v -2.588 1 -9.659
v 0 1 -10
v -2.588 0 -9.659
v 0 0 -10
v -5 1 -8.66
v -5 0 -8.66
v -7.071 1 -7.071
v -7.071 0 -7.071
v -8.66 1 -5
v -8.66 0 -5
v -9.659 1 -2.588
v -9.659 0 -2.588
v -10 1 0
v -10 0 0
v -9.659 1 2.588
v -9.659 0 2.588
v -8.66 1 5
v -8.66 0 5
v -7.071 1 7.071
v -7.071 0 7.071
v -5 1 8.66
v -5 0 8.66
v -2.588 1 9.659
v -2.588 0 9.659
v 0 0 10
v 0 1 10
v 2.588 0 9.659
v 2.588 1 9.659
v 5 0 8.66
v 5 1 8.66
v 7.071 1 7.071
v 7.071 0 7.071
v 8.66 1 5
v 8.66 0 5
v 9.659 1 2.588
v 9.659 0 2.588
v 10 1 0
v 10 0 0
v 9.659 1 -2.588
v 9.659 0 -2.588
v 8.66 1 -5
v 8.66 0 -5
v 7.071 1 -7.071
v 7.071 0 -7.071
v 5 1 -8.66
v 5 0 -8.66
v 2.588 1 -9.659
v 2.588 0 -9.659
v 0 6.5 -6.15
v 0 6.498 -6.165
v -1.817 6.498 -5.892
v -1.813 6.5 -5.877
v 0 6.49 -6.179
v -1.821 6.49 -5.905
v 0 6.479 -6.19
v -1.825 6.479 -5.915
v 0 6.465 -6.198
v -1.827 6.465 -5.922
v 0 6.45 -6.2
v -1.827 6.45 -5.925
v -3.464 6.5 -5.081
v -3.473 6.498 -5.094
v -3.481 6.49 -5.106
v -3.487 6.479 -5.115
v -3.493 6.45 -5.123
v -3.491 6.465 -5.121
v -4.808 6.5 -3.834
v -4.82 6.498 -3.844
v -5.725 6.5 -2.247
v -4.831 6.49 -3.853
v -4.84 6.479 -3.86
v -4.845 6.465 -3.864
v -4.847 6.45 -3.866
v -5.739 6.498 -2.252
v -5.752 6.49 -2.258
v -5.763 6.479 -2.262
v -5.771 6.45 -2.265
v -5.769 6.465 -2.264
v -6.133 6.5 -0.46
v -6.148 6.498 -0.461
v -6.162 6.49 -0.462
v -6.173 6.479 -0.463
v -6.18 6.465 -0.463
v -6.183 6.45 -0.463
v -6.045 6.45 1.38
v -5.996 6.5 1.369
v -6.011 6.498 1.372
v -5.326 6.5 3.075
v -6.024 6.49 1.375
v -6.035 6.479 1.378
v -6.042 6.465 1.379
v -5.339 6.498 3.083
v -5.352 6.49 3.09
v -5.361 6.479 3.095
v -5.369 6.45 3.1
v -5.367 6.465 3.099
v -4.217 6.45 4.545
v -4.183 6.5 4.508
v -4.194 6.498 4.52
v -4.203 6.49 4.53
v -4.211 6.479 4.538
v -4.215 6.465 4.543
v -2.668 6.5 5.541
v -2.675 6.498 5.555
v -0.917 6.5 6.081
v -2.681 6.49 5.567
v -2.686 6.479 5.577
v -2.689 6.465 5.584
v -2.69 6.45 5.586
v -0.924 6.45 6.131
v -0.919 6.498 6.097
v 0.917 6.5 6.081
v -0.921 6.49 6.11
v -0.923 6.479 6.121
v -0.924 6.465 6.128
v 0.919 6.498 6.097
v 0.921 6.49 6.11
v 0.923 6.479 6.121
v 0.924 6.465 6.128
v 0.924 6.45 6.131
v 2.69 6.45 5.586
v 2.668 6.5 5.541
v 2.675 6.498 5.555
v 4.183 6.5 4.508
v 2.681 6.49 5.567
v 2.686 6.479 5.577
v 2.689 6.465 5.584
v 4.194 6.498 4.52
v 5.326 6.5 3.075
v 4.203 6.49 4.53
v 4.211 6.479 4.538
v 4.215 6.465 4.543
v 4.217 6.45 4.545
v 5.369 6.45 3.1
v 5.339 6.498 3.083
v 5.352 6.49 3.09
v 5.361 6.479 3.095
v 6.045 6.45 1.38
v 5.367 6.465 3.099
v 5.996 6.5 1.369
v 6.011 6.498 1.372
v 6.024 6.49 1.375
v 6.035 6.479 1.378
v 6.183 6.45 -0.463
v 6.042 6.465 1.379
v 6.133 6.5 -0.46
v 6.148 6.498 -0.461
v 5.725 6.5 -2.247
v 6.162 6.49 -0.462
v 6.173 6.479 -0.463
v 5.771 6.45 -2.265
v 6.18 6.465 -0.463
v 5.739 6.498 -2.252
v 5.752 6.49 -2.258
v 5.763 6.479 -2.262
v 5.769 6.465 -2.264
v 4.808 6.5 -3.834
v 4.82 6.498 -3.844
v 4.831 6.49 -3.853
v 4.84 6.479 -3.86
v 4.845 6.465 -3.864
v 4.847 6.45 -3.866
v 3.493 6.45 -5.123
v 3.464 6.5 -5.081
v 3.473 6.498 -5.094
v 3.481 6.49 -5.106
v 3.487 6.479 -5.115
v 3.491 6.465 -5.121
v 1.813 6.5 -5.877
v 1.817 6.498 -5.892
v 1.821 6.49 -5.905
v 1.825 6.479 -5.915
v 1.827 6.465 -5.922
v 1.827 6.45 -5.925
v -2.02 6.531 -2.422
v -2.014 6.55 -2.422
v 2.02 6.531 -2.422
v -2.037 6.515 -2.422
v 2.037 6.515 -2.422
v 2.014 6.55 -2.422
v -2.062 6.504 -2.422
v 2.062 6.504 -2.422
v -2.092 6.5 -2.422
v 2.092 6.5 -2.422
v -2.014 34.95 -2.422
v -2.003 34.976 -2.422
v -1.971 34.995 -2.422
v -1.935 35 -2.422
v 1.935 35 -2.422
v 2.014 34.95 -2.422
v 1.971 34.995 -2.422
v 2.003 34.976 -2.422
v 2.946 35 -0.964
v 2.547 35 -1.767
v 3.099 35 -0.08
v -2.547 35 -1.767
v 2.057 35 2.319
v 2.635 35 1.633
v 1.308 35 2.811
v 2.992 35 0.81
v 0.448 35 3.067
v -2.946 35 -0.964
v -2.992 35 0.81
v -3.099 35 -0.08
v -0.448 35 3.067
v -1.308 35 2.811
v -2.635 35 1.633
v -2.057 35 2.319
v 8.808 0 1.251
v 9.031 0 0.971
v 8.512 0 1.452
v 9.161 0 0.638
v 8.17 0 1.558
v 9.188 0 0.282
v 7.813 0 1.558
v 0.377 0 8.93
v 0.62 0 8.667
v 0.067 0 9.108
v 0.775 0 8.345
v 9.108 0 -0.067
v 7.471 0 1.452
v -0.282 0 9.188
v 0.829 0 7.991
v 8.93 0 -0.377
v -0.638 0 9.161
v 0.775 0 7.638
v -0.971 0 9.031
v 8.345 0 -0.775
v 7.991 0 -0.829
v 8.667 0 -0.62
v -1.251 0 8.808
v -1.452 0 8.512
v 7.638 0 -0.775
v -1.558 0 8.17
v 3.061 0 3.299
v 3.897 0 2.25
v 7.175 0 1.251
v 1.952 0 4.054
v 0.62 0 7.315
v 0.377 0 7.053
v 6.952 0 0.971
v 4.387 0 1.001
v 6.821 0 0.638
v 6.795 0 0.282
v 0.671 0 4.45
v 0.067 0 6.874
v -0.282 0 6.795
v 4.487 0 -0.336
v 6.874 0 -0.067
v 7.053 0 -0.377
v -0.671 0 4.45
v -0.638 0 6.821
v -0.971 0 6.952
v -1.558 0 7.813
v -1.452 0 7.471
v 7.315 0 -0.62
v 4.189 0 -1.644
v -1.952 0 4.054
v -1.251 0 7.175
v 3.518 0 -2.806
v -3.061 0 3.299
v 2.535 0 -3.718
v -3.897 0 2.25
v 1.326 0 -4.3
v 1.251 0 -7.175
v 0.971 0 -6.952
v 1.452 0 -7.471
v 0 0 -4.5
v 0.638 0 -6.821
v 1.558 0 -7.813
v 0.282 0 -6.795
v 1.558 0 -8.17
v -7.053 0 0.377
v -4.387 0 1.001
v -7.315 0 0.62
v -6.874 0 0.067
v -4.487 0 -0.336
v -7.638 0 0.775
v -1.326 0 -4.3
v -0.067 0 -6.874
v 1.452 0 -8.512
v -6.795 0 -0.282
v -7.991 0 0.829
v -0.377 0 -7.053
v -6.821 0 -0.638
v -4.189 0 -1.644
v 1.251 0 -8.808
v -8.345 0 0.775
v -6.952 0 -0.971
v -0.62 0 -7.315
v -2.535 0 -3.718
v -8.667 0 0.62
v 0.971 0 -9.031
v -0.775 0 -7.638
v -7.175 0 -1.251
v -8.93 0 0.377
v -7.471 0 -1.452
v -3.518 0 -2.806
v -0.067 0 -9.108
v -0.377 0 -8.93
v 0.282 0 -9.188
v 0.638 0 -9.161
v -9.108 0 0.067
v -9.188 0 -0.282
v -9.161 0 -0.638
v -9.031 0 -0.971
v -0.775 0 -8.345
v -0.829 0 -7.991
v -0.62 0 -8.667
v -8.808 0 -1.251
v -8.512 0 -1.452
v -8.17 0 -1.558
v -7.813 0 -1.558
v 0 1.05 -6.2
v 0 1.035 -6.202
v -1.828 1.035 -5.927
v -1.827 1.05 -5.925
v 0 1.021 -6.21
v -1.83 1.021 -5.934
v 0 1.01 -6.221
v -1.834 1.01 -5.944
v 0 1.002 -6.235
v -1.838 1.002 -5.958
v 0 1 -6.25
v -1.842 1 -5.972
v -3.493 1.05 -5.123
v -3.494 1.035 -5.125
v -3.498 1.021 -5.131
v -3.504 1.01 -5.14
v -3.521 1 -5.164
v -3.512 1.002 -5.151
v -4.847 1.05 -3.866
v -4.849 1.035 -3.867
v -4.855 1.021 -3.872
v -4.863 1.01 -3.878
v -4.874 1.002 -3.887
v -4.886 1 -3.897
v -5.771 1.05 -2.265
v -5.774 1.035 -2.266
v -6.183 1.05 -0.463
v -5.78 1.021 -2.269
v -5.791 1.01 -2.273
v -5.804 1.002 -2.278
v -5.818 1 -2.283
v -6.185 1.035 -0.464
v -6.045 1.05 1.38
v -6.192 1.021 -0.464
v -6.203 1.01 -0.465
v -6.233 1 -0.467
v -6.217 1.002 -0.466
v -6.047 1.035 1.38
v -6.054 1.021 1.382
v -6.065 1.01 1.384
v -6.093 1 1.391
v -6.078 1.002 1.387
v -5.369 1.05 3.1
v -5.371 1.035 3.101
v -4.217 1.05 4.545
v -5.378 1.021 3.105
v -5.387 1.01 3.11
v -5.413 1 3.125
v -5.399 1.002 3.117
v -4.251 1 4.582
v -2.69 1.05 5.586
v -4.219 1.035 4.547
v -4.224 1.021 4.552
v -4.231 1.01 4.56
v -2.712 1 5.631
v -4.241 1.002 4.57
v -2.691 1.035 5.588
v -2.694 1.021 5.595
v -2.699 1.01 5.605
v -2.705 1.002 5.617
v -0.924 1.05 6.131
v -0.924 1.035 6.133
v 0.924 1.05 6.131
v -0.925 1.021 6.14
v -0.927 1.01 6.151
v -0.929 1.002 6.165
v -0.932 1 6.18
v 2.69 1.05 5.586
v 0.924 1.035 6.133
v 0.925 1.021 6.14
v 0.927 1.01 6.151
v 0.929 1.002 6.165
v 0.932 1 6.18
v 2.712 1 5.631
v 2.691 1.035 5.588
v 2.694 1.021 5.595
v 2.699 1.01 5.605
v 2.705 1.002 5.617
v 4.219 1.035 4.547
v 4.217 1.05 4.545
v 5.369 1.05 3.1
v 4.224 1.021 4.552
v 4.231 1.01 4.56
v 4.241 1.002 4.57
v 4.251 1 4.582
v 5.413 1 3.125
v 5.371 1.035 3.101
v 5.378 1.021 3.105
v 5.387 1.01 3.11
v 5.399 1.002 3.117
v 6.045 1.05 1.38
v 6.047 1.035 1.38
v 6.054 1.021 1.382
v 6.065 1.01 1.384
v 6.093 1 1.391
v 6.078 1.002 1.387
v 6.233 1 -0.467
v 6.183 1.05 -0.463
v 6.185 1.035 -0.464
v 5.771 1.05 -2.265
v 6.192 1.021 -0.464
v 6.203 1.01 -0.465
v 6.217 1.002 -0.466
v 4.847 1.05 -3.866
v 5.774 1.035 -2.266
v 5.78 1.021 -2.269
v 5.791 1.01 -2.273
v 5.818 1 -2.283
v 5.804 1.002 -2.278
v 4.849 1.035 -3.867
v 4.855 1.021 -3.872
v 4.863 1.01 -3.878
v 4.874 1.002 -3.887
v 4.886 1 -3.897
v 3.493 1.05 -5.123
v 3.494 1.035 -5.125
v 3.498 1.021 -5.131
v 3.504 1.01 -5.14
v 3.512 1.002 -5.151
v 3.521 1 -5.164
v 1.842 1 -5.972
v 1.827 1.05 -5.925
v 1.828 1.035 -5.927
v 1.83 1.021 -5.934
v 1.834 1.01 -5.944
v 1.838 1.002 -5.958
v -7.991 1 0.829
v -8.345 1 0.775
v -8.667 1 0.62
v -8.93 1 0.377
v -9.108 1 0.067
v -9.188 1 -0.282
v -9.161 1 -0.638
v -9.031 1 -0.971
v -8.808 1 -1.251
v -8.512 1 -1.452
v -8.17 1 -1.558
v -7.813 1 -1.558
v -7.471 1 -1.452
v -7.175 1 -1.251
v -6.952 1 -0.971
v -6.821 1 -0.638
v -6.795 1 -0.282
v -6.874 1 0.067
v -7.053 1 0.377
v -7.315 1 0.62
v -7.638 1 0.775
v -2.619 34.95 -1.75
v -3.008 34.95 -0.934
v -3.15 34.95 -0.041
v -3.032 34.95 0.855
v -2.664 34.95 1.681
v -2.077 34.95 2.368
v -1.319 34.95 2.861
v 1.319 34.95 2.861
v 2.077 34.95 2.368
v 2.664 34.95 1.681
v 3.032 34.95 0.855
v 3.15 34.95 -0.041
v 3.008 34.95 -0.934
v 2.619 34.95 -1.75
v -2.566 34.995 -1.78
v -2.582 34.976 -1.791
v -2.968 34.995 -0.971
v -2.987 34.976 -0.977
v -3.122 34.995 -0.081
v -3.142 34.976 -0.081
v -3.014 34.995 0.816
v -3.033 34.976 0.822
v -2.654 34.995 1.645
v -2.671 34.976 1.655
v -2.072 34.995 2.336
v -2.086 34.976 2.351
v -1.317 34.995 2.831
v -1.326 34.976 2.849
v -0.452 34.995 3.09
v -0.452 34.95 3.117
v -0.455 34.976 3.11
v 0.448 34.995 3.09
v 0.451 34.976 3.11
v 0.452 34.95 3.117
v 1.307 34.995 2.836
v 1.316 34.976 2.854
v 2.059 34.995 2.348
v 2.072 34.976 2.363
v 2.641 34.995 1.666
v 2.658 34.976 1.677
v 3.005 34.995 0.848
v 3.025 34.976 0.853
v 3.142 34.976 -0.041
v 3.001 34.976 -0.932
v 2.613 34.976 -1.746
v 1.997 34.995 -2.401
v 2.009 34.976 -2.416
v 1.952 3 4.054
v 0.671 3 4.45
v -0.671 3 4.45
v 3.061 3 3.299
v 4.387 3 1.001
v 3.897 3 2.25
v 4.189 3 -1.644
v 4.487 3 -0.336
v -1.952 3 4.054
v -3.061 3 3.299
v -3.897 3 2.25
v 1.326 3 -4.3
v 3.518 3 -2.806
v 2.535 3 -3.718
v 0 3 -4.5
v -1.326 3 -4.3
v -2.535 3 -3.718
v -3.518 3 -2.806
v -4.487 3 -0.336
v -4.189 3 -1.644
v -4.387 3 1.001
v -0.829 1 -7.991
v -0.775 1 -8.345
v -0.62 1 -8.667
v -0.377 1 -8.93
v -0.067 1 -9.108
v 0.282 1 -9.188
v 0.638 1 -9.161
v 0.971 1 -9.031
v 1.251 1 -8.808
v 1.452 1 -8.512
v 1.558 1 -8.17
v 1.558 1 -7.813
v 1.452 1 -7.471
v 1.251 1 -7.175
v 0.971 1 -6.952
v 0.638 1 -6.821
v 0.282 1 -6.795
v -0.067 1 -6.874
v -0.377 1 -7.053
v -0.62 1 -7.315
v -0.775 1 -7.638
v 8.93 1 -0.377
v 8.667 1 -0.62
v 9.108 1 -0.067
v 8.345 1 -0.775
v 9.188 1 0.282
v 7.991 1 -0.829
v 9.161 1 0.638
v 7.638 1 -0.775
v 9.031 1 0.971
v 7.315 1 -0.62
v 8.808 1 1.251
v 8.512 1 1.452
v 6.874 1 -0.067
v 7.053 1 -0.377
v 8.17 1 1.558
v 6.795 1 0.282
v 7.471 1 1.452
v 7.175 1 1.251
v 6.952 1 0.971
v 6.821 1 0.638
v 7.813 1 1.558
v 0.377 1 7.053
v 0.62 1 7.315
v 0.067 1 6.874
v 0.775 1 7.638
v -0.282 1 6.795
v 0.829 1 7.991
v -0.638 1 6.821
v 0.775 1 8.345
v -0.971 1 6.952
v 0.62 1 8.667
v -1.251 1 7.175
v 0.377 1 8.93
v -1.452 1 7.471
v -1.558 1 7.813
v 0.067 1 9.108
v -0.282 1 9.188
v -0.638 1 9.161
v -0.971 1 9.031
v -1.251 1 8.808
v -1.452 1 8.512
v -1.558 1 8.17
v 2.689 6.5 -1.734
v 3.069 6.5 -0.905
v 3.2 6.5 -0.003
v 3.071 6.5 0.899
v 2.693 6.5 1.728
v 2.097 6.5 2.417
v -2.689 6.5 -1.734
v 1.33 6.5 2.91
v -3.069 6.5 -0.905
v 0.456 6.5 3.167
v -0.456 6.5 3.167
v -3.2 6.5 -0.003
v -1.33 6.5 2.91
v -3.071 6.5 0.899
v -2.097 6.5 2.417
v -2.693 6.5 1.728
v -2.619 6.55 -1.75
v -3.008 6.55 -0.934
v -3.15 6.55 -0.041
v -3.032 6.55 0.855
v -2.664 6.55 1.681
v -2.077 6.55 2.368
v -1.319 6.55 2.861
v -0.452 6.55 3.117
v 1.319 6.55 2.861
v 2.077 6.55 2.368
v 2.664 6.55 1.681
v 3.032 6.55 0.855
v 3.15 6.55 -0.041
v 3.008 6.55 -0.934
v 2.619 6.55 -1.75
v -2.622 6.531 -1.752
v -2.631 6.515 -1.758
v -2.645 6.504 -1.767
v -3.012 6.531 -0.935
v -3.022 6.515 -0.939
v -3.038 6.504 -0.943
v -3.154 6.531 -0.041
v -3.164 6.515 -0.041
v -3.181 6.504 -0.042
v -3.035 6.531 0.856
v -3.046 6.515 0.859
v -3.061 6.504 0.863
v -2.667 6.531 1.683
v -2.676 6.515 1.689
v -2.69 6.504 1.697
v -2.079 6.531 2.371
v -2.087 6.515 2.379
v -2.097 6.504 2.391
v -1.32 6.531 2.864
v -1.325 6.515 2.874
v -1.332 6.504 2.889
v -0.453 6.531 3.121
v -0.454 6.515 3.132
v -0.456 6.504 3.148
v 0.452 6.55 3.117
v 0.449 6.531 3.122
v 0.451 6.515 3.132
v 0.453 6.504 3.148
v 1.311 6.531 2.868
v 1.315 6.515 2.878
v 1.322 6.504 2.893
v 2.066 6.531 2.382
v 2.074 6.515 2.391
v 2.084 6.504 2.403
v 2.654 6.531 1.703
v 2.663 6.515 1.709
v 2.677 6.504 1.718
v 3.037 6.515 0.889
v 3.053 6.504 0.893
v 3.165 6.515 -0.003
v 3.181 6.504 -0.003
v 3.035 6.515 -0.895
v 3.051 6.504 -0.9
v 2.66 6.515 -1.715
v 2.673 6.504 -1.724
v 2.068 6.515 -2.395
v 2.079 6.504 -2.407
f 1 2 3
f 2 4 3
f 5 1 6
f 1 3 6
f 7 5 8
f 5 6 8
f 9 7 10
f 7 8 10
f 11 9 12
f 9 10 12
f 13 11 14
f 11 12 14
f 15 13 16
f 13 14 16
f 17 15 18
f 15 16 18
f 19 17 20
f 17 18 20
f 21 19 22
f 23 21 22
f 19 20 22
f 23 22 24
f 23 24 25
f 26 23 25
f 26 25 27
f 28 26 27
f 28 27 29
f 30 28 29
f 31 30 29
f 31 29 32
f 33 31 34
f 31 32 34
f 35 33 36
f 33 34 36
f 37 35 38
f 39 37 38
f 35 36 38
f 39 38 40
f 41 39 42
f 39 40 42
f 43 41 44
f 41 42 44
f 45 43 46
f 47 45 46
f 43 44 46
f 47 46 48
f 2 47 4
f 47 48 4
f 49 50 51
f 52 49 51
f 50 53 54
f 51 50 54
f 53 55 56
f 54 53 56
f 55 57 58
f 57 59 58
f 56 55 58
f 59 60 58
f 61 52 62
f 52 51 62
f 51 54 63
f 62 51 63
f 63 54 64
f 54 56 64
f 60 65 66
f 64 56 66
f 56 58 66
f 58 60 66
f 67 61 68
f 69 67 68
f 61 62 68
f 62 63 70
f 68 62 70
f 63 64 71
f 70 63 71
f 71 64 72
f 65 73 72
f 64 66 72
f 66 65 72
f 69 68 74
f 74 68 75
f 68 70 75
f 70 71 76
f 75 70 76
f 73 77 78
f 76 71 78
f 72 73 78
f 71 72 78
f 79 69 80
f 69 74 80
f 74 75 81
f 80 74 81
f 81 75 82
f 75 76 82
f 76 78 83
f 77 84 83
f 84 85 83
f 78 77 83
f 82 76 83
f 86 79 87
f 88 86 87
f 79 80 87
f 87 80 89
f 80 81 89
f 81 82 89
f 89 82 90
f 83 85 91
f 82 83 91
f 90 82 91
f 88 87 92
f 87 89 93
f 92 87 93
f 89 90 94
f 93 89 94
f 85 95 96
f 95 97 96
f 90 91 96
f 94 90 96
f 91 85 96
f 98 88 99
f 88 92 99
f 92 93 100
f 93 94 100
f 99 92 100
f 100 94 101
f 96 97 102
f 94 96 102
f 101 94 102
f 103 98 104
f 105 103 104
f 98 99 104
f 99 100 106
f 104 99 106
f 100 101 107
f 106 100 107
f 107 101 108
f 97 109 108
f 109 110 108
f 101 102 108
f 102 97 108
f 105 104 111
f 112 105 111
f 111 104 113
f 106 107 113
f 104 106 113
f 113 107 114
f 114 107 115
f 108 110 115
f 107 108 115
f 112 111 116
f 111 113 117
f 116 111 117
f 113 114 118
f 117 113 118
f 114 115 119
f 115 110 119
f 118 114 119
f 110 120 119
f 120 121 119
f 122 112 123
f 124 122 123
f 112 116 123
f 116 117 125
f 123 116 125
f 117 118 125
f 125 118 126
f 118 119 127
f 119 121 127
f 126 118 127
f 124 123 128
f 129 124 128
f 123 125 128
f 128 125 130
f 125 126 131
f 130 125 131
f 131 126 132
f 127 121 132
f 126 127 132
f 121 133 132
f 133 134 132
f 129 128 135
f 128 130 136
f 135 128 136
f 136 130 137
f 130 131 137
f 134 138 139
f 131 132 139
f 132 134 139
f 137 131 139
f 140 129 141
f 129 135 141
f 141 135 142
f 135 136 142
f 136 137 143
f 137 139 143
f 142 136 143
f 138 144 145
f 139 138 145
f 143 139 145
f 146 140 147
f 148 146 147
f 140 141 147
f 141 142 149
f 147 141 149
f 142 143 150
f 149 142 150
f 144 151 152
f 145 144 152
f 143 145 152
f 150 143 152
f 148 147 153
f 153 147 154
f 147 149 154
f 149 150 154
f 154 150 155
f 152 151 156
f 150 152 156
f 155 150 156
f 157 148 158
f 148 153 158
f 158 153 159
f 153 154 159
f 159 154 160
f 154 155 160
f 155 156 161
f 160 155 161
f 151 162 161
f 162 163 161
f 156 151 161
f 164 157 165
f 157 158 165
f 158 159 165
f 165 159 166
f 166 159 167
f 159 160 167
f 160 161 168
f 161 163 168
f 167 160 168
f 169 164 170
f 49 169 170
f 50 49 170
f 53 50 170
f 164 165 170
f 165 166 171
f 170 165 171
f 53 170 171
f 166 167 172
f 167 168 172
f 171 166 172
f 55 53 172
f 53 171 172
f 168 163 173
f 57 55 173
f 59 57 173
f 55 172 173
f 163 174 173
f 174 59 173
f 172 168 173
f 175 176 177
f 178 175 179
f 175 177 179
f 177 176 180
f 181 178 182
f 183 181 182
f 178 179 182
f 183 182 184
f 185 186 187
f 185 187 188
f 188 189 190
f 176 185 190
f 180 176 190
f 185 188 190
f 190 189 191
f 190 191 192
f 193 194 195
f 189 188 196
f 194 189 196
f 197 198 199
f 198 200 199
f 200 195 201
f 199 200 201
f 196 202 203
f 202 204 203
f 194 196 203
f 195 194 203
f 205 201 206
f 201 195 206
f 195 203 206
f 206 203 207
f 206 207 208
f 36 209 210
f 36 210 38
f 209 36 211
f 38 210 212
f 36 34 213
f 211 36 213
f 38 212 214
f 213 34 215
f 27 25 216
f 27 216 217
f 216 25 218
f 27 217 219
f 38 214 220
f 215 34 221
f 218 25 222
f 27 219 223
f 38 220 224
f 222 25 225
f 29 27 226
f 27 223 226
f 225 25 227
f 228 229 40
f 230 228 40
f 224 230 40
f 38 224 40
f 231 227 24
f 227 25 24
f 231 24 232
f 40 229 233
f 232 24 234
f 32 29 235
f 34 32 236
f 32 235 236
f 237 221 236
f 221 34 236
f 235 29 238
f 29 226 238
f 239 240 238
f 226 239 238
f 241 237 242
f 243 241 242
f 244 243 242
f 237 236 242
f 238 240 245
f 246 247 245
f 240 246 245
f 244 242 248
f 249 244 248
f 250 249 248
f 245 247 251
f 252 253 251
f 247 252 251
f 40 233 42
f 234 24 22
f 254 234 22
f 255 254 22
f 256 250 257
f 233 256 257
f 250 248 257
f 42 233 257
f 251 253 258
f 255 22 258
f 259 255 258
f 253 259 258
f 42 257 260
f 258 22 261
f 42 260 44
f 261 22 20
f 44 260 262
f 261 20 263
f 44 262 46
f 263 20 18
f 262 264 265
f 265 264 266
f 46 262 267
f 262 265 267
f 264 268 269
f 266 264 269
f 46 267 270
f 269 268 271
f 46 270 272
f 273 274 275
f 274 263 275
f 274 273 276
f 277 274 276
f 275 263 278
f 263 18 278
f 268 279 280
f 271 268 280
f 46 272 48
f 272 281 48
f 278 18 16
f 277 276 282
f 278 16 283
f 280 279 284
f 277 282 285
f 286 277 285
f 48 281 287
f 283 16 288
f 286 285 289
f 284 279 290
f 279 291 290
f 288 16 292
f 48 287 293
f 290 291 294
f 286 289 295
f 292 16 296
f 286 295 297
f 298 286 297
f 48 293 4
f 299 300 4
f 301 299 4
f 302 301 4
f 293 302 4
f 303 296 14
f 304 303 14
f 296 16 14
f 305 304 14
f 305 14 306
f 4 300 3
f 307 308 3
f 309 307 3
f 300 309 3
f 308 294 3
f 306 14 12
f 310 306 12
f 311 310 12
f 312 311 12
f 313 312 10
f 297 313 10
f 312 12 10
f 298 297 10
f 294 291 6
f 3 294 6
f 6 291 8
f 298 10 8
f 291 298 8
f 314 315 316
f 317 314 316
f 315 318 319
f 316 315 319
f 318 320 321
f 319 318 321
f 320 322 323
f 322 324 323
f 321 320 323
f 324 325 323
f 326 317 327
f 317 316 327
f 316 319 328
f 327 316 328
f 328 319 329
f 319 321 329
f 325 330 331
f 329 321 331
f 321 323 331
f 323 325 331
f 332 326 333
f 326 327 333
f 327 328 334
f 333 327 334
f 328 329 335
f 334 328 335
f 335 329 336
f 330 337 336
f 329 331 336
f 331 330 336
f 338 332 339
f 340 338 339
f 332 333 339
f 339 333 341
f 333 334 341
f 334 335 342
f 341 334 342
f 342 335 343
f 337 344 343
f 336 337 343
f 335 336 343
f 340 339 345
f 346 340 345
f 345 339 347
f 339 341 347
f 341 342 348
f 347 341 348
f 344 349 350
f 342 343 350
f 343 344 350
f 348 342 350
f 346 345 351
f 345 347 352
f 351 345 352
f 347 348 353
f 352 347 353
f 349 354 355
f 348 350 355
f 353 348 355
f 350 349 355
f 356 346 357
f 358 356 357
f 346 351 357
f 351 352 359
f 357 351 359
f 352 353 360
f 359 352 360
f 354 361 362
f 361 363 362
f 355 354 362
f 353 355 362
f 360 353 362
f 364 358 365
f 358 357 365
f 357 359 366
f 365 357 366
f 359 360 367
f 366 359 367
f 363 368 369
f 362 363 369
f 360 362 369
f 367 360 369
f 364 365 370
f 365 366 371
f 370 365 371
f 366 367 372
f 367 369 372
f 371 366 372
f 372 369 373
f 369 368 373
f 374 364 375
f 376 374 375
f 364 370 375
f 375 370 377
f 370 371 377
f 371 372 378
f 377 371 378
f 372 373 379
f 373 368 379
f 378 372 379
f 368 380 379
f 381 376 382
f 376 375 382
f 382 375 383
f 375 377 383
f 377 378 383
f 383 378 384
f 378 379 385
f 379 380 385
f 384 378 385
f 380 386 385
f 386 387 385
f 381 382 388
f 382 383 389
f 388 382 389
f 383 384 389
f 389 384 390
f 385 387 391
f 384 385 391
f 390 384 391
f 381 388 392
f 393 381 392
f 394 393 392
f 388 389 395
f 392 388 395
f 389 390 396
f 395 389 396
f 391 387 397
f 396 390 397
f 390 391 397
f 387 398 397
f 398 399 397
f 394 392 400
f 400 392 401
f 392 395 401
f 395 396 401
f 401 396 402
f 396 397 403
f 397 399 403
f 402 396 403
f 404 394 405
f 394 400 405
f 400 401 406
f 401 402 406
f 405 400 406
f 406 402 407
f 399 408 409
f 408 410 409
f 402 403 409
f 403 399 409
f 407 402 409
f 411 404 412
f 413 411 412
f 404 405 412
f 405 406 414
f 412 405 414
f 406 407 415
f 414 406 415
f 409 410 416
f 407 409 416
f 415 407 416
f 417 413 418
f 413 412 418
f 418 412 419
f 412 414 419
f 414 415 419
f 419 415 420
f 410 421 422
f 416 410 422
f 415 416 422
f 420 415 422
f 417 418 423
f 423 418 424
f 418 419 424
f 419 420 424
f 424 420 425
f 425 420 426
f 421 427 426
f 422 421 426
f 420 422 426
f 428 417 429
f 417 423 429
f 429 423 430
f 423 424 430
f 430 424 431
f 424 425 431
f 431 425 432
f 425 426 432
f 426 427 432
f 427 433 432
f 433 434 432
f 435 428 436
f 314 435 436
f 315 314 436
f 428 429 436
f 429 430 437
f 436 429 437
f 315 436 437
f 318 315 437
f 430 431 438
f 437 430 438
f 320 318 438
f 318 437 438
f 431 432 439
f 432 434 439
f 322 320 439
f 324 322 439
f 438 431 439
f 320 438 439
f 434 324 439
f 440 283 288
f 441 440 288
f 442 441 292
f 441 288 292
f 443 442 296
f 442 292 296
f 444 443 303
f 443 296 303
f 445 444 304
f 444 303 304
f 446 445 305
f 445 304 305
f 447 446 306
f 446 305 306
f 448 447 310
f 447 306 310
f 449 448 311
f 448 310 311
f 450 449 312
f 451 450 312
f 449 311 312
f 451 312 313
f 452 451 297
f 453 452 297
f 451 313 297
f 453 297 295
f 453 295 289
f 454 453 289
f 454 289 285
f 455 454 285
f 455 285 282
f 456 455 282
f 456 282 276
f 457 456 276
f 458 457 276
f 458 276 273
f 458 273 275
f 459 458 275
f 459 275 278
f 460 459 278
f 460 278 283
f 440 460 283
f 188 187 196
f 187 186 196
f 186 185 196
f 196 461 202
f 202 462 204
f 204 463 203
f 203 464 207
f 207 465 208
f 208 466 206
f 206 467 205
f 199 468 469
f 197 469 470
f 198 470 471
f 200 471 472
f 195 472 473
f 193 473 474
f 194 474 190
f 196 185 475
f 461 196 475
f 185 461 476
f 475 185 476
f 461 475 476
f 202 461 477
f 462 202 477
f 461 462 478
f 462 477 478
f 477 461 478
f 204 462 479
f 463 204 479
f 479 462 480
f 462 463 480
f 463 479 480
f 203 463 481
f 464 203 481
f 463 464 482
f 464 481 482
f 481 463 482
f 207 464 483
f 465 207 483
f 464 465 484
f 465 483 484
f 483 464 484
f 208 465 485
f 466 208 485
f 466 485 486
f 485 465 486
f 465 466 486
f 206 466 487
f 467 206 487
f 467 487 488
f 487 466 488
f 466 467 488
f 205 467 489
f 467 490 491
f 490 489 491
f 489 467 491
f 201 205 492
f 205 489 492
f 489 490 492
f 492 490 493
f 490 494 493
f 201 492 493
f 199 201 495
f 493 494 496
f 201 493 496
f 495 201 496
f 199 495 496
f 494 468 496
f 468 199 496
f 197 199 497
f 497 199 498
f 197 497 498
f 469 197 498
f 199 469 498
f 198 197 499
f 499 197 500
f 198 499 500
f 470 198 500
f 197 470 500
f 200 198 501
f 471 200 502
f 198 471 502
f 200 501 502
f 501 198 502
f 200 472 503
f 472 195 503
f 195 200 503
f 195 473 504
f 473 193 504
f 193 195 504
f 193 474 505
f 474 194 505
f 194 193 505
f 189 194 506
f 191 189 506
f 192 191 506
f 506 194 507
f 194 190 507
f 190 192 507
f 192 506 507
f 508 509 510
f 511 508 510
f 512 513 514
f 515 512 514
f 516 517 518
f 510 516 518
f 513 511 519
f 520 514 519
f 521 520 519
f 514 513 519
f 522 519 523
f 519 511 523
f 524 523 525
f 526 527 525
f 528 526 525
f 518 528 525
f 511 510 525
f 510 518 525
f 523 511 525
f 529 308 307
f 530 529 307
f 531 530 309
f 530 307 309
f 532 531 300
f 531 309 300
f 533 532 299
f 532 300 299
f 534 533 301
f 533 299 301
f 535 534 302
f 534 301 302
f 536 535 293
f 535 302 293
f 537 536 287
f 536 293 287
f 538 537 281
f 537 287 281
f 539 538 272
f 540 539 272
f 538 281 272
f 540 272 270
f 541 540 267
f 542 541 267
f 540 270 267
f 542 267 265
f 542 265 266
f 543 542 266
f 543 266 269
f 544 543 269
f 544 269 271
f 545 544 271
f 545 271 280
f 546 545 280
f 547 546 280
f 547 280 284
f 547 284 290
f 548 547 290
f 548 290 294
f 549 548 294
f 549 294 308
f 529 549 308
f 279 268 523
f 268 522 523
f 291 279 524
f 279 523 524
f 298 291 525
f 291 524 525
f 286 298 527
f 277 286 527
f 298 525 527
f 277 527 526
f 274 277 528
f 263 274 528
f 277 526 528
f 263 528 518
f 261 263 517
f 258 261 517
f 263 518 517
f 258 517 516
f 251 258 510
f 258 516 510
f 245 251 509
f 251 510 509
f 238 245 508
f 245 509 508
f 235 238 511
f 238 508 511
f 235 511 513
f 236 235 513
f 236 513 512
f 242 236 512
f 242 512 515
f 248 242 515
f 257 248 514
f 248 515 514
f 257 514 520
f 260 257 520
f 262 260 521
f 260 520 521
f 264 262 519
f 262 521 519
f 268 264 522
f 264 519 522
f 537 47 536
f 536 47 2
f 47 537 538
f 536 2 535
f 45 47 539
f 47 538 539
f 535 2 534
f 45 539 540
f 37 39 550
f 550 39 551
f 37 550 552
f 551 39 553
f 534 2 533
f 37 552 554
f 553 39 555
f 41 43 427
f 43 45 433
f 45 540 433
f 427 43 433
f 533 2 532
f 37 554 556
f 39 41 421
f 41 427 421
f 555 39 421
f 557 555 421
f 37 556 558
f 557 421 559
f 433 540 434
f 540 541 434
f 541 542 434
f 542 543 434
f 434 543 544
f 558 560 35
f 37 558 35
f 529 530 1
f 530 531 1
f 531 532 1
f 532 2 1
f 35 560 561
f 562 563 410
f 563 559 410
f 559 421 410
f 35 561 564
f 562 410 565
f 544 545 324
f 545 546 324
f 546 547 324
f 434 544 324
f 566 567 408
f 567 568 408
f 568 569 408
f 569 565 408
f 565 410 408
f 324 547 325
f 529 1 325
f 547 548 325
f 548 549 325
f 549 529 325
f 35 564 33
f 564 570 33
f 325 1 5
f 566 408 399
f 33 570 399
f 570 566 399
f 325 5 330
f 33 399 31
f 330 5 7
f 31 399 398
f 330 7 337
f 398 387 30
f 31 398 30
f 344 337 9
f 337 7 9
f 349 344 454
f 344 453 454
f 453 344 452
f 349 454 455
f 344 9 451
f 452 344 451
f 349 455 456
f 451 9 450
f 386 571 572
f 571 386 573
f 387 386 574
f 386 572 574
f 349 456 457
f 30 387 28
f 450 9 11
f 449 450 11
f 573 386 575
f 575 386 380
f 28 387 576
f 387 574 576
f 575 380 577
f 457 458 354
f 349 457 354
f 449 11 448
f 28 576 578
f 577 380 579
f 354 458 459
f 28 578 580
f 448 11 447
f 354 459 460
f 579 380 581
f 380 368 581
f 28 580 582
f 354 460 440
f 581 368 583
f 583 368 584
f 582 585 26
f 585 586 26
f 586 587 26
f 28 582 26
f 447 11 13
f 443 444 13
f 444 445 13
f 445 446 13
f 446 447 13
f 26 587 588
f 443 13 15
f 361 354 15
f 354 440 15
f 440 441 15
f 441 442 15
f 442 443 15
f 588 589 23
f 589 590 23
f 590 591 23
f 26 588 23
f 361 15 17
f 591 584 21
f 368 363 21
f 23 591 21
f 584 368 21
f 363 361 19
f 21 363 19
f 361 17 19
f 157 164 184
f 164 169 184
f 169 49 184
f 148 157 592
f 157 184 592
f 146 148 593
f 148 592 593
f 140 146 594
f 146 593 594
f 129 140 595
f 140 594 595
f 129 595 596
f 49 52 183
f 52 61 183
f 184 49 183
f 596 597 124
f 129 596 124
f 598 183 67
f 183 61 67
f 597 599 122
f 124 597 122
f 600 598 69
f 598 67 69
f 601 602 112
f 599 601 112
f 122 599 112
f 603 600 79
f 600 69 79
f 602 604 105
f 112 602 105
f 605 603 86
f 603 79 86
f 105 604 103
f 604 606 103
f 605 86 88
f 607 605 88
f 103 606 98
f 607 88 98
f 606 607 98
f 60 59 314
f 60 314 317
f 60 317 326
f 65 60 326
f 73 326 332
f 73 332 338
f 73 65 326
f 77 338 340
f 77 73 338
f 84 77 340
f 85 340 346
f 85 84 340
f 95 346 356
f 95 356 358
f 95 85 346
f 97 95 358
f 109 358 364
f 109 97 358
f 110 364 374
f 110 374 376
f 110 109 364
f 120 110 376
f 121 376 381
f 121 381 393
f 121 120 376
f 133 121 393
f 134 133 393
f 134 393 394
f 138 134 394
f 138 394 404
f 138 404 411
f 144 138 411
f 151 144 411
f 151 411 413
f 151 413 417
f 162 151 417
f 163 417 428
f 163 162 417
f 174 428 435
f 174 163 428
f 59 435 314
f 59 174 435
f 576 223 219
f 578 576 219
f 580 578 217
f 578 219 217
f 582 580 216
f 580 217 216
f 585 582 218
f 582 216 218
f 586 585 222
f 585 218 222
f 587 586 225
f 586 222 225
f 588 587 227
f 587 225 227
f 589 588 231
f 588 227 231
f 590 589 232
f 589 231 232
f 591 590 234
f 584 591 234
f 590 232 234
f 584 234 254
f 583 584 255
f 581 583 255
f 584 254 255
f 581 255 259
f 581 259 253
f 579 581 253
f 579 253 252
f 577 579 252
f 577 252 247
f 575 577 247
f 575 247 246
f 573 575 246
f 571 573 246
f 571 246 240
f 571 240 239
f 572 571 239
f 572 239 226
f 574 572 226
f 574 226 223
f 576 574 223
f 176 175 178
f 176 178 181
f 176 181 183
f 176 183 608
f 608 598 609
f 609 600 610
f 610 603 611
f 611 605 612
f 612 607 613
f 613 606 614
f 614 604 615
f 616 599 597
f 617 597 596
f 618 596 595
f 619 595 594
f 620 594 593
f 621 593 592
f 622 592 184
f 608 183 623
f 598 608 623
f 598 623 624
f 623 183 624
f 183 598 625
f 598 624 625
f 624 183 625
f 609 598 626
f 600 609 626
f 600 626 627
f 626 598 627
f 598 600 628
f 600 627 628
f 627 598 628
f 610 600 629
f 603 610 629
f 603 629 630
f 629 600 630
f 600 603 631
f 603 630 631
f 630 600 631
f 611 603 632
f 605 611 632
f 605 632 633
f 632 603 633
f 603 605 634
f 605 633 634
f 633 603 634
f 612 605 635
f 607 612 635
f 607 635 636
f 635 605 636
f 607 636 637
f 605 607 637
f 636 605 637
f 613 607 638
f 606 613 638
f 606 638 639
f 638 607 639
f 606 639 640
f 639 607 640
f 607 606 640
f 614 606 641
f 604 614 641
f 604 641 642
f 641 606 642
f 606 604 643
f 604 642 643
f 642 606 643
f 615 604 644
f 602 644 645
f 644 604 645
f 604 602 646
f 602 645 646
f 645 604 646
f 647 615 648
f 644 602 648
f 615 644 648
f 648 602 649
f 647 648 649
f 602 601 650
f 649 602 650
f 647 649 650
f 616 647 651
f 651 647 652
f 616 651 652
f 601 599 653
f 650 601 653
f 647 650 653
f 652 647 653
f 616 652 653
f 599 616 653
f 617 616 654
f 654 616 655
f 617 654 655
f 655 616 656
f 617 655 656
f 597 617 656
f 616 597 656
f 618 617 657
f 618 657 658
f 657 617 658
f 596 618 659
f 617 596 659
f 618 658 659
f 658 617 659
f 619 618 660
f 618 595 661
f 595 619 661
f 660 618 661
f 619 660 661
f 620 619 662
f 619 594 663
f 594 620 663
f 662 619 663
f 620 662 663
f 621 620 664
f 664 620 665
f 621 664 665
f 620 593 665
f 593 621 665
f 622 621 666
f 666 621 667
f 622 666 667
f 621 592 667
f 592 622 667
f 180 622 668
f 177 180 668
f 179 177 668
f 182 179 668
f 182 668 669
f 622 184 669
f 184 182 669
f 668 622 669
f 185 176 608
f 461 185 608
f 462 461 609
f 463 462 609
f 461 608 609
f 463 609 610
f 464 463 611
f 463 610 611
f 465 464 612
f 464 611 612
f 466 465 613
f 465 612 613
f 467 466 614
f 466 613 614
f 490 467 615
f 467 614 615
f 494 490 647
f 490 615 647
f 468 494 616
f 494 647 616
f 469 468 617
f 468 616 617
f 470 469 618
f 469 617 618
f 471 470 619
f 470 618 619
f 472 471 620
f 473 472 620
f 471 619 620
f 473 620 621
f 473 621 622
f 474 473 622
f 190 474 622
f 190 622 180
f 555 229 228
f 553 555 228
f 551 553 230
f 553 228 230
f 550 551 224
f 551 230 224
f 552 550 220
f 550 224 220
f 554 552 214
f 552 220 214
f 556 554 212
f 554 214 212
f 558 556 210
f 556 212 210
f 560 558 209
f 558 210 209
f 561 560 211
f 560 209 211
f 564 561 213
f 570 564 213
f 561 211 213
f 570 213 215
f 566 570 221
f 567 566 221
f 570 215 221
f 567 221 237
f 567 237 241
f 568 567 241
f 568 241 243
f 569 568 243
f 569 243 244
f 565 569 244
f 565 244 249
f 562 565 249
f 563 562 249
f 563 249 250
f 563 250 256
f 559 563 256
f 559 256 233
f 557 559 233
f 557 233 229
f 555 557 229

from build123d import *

# Parameters (mm, degrees)
ESQUISSE3_W                  = 6.57785754
ESQUISSE3_H                  = 1.386048805
ENL_V_MAT_EXTRU_1_DEPTH      = 28.5
D_GAGEMENT_M21_D             = 2.4
R_P_TITION_CIRCULAIRE1_COUNT = 4
CONG_1_R                     = 0.05


with BuildPart() as part:
    # Esquisse2 → Révolution2 (revolve)
    with BuildSketch(Plane.XY, mode=Mode.PRIVATE) as r_volution2_sk:
        Polygon((0, 35), (3.15, 35), (3.15, 6.5), (6.2, 6.5), (6.2, 3), (6.2, 1), (10, 1), (10, 0), (4.5, 0), (4.5, 3), (0, 3), align=None)
    revolve(r_volution2_sk.sketch.rotate(Axis((0, 3, 0), (0, 1, 0)), 90), axis=Axis((0, 3, 0), (0, 1, 0)))

    # Esquisse3 → Enlèv. mat.-Extru.1 (cut)
    with BuildSketch(Plane(origin=(0, 35, 0), x_dir=(1, 0, 0), z_dir=(0, 1, 0))):
        with Locations((-0.352413472, 3.114928535)):
            Rectangle(ESQUISSE3_W, ESQUISSE3_H)
    extrude(amount=-ENL_V_MAT_EXTRU_1_DEPTH, mode=Mode.SUBTRACT)

    # Dégagement M21 (through all)
    with Locations(Plane(origin=(0, 1, 0), x_dir=(1, 0, 0), z_dir=(0, 1, 0))):
        with Locations((0.371303159, 7.991378727)):
            d_gagement_m21 = Hole(D_GAGEMENT_M21_D / 2)

    # Répétition circulaire1: Dégagement M21 ×4 about axis
    r_p_tition_circulaire1_axis = Axis((0, 0, 0), (0, 1, 0))
    for i in range(1, R_P_TITION_CIRCULAIRE1_COUNT):
        add(d_gagement_m21.rotate(r_p_tition_circulaire1_axis, i * 360 / R_P_TITION_CIRCULAIRE1_COUNT), mode=Mode.SUBTRACT)

    # Congé1
    cong_1_edges = [part.edges().sort_by_distance(p)[0] for p in [
        (0, 6.5, 6.2),
        (0, 6.5, 3.15),
        (0, 35, 3.15),
        (0, 1, 6.2),
    ]]
    fillet(cong_1_edges, radius=CONG_1_R)


solid = part.part
